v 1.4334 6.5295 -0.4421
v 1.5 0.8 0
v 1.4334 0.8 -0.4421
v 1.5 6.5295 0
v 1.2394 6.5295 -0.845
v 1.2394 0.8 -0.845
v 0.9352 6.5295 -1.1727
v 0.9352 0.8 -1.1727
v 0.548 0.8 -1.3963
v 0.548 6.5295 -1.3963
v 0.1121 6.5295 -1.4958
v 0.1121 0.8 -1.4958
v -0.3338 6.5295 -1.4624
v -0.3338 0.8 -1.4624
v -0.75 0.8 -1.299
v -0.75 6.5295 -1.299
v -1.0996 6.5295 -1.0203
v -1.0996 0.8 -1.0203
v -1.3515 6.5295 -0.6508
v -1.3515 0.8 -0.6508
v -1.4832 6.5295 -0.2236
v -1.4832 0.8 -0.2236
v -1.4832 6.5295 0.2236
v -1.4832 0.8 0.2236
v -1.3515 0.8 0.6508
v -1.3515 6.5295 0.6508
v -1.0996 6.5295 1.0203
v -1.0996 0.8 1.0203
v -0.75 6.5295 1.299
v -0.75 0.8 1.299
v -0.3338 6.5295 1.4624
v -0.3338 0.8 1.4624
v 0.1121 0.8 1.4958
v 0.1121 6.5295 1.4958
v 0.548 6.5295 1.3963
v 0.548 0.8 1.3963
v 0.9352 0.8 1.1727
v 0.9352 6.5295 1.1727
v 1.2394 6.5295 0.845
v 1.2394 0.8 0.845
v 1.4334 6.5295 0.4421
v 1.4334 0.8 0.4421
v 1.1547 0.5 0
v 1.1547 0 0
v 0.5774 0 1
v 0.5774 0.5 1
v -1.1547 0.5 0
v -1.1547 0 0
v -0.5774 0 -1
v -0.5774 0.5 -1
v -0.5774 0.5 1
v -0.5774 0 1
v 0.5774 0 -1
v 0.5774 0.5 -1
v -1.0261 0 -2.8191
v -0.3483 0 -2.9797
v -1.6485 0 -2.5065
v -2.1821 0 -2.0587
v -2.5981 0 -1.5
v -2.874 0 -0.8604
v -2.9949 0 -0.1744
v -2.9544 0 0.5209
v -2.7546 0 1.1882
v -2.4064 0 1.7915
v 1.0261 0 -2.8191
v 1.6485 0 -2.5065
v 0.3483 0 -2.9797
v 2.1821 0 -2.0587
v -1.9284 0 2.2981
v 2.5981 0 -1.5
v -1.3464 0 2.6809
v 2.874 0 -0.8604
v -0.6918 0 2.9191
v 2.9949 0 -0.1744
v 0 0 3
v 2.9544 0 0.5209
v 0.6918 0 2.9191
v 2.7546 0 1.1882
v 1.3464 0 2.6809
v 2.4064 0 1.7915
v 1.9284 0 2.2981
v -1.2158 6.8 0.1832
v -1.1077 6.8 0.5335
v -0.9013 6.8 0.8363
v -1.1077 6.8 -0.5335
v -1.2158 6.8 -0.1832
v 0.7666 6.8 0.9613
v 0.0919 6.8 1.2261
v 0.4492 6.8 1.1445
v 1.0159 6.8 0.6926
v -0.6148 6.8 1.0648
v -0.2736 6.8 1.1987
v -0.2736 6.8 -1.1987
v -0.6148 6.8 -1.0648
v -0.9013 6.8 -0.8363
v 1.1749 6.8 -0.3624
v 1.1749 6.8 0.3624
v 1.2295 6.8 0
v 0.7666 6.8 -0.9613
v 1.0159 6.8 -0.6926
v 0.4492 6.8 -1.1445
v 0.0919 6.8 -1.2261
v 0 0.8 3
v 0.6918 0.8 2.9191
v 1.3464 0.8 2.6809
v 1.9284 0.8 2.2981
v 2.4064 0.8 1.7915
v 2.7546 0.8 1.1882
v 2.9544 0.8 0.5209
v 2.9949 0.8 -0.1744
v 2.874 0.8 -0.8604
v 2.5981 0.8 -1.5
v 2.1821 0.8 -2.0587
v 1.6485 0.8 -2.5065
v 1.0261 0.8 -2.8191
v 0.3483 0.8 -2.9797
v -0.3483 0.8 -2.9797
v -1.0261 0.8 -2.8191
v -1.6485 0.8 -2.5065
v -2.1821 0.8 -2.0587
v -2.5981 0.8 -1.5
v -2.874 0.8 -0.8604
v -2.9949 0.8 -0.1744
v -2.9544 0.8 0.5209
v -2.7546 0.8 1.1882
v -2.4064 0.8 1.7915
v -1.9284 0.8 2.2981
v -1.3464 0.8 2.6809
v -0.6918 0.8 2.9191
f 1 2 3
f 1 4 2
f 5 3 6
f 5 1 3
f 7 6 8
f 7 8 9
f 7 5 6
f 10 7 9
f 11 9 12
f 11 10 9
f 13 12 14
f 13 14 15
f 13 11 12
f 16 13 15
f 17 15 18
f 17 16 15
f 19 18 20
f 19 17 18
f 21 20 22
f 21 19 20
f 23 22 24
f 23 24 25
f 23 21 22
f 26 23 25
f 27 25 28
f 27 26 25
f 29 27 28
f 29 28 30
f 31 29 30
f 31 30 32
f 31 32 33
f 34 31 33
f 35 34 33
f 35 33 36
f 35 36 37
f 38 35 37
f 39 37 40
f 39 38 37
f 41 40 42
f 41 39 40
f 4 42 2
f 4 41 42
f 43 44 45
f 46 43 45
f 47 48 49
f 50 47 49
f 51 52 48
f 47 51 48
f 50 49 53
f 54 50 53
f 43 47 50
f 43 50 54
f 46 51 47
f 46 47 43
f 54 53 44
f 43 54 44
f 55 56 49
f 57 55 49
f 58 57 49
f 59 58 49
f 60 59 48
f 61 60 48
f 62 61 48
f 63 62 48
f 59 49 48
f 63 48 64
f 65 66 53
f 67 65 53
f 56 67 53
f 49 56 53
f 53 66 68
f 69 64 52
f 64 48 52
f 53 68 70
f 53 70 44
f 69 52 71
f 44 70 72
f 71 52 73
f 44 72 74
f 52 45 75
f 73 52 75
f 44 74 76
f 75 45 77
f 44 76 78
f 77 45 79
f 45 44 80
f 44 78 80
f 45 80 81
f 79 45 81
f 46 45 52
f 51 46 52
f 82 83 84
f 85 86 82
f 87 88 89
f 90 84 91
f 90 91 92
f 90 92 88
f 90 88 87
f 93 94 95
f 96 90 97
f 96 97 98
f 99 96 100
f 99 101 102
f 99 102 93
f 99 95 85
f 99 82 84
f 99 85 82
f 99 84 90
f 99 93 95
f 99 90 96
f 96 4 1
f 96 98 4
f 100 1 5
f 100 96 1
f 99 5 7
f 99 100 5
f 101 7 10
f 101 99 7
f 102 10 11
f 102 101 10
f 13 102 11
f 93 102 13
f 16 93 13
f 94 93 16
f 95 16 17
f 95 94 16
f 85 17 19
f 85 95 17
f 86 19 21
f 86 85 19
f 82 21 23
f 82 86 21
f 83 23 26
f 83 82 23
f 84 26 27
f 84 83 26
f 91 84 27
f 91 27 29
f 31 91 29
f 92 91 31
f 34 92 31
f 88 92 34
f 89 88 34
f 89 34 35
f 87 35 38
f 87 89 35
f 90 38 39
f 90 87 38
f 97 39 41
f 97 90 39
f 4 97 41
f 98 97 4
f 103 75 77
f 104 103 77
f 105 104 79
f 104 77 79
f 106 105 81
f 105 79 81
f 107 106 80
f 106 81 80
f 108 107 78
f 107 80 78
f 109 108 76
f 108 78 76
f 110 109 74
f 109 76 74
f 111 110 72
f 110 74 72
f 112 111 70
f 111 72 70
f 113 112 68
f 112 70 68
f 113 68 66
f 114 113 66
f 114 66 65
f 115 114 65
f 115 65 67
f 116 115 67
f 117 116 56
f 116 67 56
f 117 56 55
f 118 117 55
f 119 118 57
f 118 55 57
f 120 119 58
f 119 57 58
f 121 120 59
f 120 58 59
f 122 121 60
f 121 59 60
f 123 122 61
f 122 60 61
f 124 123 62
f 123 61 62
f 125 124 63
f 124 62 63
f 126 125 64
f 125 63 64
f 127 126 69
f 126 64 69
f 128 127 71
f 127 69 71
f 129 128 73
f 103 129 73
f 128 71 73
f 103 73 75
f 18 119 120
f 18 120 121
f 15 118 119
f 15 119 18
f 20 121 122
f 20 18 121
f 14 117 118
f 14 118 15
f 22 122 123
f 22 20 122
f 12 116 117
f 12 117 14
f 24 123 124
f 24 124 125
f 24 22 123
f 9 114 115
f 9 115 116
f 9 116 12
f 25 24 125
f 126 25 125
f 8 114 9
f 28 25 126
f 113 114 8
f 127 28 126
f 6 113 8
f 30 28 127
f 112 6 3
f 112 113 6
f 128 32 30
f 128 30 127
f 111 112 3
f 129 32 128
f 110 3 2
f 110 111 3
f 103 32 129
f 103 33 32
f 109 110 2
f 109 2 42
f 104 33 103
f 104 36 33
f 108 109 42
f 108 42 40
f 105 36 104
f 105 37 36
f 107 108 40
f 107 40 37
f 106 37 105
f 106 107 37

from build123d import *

# Parameters (mm, degrees)
SKETCH_1_R          = 3
EXTRUDE_1_DEPTH     = 0.8
CUT_EXTRUDE_1_DEPTH = 0.5


# Read off the part's stored shape, not the designer's step: M3 机械螺纹 螺柱3
with BuildPart() as part:
    # 草图1 → 凸台-拉伸1 (new body)
    with BuildSketch(Plane(origin=(0, 0, 0), x_dir=(1, 0, 0), z_dir=(0, 1, 0))):
        with Locations(Location((0, 0, 0), (0, 0, 270))):
            Circle(SKETCH_1_R)
    extrude(amount=EXTRUDE_1_DEPTH)

    # M3 机械螺纹 螺柱3 outline → M3 机械螺纹 螺柱3 (revolve)
    with BuildSketch(Plane.XY):
        Polygon((1.2295, 6.8), (0, 6.8), (0, 0.8), (1.5, 0.8), (1.5, 6.5295), align=None)
    revolve(axis=Axis((0, 0, 0), (0, 1, 0)))

    # 草图8 → 切除-拉伸1 (cut)
    with BuildSketch(Plane.XZ):
        Polygon((1.154700538, 0), (0.577350269, 1), (-0.577350269, 1), (-1.154700538, 0), (-0.577350269, -1), (0.577350269, -1), align=None)
    extrude(amount=-CUT_EXTRUDE_1_DEPTH, mode=Mode.SUBTRACT)


solid = part.part
